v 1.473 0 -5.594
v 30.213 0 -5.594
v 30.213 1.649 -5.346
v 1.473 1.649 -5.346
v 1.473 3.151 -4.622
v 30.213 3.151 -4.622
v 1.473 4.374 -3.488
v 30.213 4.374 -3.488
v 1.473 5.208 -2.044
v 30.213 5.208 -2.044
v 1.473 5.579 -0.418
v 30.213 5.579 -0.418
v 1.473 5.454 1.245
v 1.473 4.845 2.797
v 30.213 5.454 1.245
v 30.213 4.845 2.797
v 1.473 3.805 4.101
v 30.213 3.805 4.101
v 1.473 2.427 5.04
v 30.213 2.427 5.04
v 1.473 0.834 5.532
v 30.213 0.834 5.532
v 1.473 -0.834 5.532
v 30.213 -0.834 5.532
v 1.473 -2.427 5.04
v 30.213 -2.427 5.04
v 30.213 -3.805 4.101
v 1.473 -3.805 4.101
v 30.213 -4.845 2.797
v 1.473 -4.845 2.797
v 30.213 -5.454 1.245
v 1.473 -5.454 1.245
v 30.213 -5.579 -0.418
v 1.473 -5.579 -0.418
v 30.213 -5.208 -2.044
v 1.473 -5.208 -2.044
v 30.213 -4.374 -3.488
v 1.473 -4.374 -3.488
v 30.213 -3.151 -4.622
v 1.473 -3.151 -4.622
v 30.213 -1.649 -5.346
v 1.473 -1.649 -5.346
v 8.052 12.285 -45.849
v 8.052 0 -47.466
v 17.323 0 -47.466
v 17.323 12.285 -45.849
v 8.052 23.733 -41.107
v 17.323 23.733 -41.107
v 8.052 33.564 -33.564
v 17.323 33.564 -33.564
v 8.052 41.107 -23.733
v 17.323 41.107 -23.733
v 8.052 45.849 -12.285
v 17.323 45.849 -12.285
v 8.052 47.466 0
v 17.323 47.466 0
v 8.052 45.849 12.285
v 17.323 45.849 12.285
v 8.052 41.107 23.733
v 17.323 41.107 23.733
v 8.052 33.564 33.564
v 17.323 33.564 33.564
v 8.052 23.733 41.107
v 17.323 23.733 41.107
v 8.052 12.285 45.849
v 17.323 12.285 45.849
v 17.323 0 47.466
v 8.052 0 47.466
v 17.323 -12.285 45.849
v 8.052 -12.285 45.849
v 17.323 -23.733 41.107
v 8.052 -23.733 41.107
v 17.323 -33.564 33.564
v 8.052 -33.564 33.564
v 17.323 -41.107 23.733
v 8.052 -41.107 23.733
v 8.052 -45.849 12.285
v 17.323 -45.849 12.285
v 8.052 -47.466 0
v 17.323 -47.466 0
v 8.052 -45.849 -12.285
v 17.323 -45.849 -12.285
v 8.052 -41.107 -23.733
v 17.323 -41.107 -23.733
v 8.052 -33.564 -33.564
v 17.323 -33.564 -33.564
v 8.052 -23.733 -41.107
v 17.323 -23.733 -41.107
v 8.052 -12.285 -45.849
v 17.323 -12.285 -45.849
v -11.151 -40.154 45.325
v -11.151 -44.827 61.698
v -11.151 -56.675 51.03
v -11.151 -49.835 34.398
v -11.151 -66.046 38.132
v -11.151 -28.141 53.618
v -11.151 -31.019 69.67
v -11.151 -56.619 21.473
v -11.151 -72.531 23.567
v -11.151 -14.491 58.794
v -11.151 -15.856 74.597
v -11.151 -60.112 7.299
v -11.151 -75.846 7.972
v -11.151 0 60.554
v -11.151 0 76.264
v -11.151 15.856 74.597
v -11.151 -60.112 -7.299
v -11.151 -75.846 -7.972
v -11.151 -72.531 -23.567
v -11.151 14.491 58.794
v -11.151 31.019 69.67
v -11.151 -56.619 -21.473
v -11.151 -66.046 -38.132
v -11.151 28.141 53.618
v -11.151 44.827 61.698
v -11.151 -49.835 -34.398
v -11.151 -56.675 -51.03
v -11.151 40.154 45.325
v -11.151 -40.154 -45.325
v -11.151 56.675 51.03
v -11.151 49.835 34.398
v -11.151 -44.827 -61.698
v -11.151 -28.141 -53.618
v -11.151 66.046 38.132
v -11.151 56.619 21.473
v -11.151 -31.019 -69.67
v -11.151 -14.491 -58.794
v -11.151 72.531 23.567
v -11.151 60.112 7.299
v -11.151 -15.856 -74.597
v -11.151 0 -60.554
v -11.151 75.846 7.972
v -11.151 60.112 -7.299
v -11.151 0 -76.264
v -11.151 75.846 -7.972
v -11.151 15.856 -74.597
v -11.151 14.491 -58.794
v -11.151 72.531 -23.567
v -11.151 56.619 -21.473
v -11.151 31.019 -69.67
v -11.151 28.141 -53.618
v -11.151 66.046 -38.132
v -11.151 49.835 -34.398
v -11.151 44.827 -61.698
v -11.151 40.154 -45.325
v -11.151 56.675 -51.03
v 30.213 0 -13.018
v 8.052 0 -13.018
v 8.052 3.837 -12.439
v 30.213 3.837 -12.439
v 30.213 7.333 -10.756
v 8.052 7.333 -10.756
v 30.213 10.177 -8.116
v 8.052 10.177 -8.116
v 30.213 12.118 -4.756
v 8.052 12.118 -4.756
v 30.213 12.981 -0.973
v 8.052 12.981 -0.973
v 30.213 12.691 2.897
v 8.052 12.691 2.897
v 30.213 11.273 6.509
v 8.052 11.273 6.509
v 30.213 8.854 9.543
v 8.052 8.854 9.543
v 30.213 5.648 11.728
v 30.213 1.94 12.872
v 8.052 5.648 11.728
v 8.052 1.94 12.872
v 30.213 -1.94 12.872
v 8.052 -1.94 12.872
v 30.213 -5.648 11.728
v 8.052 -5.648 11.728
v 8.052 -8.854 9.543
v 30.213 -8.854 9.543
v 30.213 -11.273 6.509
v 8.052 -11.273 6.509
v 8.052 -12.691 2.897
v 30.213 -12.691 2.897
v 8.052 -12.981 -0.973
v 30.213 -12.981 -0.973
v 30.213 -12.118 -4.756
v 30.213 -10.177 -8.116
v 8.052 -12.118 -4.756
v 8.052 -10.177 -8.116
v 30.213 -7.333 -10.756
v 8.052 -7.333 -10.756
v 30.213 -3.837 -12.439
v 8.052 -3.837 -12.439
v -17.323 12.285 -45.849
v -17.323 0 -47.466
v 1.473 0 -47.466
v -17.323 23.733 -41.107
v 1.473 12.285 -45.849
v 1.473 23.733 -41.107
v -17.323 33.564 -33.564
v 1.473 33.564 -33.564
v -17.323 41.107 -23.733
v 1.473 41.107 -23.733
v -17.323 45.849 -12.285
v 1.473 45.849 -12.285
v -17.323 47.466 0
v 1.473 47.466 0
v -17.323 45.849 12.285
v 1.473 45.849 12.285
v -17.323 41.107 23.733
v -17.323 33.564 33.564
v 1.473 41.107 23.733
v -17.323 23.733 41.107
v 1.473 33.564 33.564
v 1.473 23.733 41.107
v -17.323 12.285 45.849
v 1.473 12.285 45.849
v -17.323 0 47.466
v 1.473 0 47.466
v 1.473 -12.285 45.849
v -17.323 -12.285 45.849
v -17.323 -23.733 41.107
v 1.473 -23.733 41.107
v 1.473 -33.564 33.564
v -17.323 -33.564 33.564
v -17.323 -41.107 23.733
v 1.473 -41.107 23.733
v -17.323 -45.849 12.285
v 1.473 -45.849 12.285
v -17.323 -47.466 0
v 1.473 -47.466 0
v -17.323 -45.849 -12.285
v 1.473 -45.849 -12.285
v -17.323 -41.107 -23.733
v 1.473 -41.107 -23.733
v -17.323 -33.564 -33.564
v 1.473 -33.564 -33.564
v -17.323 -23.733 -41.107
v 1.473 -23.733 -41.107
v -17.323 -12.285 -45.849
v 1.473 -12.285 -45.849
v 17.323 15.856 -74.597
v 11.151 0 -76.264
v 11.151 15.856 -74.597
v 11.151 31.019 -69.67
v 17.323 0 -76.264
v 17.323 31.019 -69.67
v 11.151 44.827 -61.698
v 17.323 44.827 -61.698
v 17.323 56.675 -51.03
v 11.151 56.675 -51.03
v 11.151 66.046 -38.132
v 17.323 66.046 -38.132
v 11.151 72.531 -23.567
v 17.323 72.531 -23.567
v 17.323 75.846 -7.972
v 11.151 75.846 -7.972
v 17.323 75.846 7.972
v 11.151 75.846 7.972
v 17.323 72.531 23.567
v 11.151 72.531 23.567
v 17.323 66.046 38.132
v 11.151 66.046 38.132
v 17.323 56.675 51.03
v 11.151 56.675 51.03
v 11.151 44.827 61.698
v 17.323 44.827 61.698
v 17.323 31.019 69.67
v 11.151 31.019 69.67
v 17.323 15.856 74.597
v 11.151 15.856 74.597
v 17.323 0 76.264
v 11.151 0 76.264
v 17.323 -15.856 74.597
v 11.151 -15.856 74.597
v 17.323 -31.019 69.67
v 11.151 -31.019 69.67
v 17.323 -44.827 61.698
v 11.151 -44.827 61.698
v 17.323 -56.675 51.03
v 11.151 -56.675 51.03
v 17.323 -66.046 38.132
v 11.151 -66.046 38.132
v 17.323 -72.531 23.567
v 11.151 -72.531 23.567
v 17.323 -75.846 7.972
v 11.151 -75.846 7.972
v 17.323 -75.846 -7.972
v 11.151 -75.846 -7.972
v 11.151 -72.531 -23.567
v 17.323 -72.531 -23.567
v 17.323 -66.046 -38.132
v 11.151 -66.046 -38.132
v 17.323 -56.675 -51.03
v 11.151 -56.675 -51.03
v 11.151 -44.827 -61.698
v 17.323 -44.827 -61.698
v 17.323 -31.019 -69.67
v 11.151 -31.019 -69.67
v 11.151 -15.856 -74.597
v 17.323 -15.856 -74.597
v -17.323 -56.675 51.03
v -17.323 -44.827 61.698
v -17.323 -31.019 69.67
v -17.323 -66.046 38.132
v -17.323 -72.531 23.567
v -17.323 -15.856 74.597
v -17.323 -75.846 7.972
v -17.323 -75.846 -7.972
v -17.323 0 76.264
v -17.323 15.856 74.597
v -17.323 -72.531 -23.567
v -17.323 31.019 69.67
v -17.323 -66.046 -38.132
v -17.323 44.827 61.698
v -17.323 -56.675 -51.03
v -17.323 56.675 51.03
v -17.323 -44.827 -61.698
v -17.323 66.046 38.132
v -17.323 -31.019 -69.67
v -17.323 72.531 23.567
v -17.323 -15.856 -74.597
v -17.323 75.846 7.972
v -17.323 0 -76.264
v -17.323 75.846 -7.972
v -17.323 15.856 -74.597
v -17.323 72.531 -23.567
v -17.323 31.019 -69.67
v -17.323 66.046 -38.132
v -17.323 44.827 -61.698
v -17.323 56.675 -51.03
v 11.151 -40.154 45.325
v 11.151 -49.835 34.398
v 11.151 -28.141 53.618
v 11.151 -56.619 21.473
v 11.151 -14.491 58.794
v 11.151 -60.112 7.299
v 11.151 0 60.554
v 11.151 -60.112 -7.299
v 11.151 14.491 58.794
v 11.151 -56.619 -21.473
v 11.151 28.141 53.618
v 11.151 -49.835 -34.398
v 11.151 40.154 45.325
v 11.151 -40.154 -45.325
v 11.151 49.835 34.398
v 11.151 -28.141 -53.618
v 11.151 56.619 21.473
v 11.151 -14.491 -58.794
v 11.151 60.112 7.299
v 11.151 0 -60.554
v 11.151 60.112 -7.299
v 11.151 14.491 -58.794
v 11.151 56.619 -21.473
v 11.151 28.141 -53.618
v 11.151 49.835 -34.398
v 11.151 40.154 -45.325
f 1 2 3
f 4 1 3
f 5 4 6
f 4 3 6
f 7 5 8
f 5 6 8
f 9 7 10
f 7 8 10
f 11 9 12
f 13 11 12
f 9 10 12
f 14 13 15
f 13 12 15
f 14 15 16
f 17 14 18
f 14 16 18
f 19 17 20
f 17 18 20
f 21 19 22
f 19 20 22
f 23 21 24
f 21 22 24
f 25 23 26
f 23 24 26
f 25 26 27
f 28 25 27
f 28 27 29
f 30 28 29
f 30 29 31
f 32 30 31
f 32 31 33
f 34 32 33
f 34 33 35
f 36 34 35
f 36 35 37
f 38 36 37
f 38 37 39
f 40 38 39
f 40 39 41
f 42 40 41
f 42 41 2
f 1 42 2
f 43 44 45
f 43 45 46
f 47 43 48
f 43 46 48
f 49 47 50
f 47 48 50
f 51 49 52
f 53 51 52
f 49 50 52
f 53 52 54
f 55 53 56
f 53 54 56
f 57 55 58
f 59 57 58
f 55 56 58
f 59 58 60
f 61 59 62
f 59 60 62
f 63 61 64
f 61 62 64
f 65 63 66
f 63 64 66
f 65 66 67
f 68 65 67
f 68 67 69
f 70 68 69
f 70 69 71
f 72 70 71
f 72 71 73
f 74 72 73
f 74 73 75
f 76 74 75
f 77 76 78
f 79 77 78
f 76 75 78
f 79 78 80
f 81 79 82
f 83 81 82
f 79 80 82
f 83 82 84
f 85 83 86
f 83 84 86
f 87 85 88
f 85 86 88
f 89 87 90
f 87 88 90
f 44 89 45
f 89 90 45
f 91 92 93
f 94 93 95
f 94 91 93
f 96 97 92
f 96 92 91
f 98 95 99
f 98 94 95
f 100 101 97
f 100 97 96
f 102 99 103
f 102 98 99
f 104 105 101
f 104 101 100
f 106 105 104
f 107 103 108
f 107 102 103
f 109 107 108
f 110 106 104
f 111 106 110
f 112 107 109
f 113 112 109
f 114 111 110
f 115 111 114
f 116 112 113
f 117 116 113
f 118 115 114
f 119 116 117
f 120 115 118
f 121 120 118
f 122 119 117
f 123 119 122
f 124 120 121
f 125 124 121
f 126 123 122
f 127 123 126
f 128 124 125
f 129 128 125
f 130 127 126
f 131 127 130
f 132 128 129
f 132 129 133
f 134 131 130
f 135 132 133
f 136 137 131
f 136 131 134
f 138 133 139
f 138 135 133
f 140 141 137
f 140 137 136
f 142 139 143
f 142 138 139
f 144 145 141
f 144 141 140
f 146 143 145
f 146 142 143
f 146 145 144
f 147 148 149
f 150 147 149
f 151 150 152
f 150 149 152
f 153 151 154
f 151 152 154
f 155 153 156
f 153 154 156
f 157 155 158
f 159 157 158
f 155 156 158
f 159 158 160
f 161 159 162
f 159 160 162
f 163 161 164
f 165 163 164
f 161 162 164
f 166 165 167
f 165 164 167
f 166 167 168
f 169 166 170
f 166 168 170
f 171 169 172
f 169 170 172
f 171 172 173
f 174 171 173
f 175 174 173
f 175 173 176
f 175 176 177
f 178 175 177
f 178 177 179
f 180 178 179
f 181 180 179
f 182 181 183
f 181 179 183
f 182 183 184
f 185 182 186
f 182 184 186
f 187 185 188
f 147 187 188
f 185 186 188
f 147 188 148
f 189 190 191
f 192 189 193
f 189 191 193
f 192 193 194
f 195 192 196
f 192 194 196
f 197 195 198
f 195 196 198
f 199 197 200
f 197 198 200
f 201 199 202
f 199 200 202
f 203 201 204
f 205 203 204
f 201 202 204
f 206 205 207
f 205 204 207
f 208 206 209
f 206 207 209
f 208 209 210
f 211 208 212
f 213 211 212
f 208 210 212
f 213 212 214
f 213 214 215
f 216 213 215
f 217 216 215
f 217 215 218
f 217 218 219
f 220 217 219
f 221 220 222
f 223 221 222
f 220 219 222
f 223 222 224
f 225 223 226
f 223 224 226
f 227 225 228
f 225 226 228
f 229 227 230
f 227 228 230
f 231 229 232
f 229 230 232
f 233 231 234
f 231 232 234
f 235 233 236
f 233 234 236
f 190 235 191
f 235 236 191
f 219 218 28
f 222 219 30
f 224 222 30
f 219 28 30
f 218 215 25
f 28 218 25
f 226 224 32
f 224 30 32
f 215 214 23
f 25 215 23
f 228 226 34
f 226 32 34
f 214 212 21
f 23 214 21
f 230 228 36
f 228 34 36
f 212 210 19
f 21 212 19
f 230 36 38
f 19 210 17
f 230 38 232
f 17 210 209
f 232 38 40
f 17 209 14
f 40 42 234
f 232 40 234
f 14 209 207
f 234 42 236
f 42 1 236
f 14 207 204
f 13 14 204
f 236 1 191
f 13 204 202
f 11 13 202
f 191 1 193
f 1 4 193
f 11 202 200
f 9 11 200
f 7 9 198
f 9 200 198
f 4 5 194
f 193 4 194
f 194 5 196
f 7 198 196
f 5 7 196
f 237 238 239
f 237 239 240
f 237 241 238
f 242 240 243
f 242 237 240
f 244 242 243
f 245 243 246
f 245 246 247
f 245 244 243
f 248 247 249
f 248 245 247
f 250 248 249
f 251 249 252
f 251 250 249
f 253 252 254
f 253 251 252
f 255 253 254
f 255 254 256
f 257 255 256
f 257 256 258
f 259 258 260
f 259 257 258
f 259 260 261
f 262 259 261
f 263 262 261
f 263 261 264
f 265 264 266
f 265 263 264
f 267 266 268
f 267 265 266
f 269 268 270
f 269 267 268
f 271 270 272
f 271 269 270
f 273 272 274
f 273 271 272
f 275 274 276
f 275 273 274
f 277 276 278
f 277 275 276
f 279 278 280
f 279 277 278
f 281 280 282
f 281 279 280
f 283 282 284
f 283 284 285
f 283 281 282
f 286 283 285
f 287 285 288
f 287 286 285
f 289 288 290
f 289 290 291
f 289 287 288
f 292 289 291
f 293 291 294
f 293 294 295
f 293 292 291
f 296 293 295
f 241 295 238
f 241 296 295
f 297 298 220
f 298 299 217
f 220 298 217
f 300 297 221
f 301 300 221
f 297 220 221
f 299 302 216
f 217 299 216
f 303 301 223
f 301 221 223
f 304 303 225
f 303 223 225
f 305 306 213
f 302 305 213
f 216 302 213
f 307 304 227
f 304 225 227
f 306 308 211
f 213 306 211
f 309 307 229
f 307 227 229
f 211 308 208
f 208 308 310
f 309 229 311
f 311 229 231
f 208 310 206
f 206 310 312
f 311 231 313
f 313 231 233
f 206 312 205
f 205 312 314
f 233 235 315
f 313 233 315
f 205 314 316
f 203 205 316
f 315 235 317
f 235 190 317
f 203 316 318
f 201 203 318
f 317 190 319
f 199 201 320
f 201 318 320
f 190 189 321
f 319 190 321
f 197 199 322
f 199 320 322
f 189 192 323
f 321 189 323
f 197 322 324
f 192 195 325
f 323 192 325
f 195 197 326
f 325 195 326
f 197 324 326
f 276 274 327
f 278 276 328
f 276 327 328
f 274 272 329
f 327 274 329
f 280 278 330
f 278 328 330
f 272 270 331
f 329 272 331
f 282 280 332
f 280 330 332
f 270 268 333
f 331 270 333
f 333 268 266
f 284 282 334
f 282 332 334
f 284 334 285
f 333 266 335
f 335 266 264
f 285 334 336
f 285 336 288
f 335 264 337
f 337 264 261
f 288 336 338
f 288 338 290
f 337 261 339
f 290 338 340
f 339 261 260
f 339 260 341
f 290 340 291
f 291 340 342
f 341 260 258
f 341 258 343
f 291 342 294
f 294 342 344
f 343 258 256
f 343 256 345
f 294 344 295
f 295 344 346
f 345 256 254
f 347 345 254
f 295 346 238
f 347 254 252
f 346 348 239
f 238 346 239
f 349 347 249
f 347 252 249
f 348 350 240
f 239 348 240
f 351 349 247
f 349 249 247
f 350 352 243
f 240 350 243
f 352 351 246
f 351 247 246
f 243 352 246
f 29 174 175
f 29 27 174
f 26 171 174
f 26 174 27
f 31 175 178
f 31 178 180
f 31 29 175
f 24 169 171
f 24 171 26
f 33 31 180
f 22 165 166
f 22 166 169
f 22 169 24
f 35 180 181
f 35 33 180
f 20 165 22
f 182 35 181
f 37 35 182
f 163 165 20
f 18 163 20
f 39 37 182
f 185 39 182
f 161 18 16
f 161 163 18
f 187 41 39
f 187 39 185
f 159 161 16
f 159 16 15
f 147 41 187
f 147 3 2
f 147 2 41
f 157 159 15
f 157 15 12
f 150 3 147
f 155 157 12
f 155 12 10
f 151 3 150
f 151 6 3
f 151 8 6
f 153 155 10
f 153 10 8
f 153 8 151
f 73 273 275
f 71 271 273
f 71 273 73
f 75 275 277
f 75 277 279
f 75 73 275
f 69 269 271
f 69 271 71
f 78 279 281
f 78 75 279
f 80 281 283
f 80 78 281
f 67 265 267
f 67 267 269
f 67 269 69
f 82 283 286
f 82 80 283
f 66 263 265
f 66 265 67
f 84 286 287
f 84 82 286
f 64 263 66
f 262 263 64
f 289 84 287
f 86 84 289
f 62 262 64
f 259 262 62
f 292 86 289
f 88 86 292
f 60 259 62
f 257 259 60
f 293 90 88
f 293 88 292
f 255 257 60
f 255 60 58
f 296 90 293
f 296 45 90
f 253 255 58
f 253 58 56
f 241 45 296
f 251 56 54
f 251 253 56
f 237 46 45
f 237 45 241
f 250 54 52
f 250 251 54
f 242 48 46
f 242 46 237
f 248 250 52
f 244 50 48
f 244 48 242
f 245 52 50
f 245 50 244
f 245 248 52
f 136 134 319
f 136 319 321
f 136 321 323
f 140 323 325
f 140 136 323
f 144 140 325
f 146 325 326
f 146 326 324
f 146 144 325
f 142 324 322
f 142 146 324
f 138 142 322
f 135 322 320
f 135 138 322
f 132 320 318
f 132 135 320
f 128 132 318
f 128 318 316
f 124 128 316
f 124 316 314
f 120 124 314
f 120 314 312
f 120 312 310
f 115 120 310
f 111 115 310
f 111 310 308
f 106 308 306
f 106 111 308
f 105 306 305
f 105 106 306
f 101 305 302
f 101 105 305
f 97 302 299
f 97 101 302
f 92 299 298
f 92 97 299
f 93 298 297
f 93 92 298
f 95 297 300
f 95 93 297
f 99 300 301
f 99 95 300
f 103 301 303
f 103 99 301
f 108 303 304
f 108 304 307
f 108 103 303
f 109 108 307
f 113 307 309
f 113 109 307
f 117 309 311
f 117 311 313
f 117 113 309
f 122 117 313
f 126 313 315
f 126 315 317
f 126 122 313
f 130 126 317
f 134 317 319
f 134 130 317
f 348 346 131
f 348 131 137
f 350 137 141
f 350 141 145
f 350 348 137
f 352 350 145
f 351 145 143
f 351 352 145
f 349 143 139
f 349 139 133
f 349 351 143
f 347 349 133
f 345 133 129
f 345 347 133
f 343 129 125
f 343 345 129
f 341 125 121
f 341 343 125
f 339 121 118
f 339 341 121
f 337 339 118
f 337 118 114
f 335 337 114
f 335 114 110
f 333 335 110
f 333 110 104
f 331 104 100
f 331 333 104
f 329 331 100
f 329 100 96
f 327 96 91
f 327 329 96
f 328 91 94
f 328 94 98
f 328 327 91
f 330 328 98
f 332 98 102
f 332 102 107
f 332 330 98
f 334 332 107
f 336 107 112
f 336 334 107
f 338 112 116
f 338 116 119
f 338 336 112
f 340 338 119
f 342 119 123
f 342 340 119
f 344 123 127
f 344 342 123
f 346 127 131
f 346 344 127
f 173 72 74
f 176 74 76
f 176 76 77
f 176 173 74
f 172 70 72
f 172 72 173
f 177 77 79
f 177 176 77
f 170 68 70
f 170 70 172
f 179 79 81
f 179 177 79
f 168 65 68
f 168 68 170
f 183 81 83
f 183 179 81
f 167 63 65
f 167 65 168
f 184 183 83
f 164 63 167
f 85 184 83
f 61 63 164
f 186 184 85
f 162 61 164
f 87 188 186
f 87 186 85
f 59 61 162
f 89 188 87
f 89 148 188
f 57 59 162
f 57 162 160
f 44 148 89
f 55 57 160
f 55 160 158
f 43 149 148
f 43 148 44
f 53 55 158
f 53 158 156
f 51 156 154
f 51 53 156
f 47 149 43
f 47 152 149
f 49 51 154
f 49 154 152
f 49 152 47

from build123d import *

# Parameters (mm, degrees)
SKETCH1_R           = 76.2635
BOSS_EXTRUDE1_DEPTH = 17.3228
SKETCH2_R           = 47.46625
CUT_EXTRUDE1_DEPTH  = 9.271
CUT_EXTRUDE2_START  = -15.8496
SKETCH2_2_R         = 47.46625
CUT_EXTRUDE2_DEPTH  = 18.796
CUT_EXTRUDE3_START  = -6.1722
SKETCH3_OUTSIDE_W   = 198.222
SKETCH3_OUTSIDE_H   = 198.222
SKETCH3_OUTSIDE_R   = 60.5536
CUT_EXTRUDE3_DEPTH  = 22.3012
SKETCH4_R           = 13.0175
BOSS_EXTRUDE2_DEPTH = 22.1615
SKETCH5_R           = 5.59435
CUT_EXTRUDE4_DEPTH  = 118.864004971


with BuildPart() as part:
    # Sketch1 → Boss-Extrude1 (new, symmetric)
    with BuildSketch(Plane(origin=(0, 0, 0), x_dir=(0, 0, -1), z_dir=(1, 0, 0))):
        Circle(SKETCH1_R)
    extrude(amount=BOSS_EXTRUDE1_DEPTH, both=True)

    # Sketch2 → Cut-Extrude1 (cut)
    with BuildSketch(Plane(origin=(17.3228, 0, 0), x_dir=(0, 0, -1), z_dir=(1, 0, 0))):
        Circle(SKETCH2_R)
    extrude(amount=-CUT_EXTRUDE1_DEPTH, mode=Mode.SUBTRACT)

    # Sketch2<2> → Cut-Extrude2 (cut)
    with BuildSketch(Plane(origin=(17.3228, 0, 0), x_dir=(0, 0, -1), z_dir=(1, 0, 0)).offset(CUT_EXTRUDE2_START)):
        Circle(SKETCH2_2_R)
    extrude(amount=-CUT_EXTRUDE2_DEPTH, mode=Mode.SUBTRACT)

    # Sketch3 outside → Cut-Extrude3 (cut)
    with BuildSketch(Plane(origin=(17.3228, 0, 0), x_dir=(0, 0, -1), z_dir=(1, 0, 0)).offset(CUT_EXTRUDE3_START)):
        Rectangle(SKETCH3_OUTSIDE_W, SKETCH3_OUTSIDE_H)
        Circle(SKETCH3_OUTSIDE_R, mode=Mode.SUBTRACT)
    extrude(amount=-CUT_EXTRUDE3_DEPTH, mode=Mode.SUBTRACT)

    # Sketch4 → Boss-Extrude2 (add)
    with BuildSketch(Plane(origin=(8.0518, 0, 0), x_dir=(0, 0, -1), z_dir=(1, 0, 0))):
        Circle(SKETCH4_R)
    extrude(amount=BOSS_EXTRUDE2_DEPTH)

    # Sketch5 → Cut-Extrude4 (cut, through all)
    with BuildSketch(Plane(origin=(30.2133, 0, 0), x_dir=(0, 0, -1), z_dir=(1, 0, 0))):
        Circle(SKETCH5_R)
    extrude(amount=-CUT_EXTRUDE4_DEPTH, mode=Mode.SUBTRACT)


solid = part.part
